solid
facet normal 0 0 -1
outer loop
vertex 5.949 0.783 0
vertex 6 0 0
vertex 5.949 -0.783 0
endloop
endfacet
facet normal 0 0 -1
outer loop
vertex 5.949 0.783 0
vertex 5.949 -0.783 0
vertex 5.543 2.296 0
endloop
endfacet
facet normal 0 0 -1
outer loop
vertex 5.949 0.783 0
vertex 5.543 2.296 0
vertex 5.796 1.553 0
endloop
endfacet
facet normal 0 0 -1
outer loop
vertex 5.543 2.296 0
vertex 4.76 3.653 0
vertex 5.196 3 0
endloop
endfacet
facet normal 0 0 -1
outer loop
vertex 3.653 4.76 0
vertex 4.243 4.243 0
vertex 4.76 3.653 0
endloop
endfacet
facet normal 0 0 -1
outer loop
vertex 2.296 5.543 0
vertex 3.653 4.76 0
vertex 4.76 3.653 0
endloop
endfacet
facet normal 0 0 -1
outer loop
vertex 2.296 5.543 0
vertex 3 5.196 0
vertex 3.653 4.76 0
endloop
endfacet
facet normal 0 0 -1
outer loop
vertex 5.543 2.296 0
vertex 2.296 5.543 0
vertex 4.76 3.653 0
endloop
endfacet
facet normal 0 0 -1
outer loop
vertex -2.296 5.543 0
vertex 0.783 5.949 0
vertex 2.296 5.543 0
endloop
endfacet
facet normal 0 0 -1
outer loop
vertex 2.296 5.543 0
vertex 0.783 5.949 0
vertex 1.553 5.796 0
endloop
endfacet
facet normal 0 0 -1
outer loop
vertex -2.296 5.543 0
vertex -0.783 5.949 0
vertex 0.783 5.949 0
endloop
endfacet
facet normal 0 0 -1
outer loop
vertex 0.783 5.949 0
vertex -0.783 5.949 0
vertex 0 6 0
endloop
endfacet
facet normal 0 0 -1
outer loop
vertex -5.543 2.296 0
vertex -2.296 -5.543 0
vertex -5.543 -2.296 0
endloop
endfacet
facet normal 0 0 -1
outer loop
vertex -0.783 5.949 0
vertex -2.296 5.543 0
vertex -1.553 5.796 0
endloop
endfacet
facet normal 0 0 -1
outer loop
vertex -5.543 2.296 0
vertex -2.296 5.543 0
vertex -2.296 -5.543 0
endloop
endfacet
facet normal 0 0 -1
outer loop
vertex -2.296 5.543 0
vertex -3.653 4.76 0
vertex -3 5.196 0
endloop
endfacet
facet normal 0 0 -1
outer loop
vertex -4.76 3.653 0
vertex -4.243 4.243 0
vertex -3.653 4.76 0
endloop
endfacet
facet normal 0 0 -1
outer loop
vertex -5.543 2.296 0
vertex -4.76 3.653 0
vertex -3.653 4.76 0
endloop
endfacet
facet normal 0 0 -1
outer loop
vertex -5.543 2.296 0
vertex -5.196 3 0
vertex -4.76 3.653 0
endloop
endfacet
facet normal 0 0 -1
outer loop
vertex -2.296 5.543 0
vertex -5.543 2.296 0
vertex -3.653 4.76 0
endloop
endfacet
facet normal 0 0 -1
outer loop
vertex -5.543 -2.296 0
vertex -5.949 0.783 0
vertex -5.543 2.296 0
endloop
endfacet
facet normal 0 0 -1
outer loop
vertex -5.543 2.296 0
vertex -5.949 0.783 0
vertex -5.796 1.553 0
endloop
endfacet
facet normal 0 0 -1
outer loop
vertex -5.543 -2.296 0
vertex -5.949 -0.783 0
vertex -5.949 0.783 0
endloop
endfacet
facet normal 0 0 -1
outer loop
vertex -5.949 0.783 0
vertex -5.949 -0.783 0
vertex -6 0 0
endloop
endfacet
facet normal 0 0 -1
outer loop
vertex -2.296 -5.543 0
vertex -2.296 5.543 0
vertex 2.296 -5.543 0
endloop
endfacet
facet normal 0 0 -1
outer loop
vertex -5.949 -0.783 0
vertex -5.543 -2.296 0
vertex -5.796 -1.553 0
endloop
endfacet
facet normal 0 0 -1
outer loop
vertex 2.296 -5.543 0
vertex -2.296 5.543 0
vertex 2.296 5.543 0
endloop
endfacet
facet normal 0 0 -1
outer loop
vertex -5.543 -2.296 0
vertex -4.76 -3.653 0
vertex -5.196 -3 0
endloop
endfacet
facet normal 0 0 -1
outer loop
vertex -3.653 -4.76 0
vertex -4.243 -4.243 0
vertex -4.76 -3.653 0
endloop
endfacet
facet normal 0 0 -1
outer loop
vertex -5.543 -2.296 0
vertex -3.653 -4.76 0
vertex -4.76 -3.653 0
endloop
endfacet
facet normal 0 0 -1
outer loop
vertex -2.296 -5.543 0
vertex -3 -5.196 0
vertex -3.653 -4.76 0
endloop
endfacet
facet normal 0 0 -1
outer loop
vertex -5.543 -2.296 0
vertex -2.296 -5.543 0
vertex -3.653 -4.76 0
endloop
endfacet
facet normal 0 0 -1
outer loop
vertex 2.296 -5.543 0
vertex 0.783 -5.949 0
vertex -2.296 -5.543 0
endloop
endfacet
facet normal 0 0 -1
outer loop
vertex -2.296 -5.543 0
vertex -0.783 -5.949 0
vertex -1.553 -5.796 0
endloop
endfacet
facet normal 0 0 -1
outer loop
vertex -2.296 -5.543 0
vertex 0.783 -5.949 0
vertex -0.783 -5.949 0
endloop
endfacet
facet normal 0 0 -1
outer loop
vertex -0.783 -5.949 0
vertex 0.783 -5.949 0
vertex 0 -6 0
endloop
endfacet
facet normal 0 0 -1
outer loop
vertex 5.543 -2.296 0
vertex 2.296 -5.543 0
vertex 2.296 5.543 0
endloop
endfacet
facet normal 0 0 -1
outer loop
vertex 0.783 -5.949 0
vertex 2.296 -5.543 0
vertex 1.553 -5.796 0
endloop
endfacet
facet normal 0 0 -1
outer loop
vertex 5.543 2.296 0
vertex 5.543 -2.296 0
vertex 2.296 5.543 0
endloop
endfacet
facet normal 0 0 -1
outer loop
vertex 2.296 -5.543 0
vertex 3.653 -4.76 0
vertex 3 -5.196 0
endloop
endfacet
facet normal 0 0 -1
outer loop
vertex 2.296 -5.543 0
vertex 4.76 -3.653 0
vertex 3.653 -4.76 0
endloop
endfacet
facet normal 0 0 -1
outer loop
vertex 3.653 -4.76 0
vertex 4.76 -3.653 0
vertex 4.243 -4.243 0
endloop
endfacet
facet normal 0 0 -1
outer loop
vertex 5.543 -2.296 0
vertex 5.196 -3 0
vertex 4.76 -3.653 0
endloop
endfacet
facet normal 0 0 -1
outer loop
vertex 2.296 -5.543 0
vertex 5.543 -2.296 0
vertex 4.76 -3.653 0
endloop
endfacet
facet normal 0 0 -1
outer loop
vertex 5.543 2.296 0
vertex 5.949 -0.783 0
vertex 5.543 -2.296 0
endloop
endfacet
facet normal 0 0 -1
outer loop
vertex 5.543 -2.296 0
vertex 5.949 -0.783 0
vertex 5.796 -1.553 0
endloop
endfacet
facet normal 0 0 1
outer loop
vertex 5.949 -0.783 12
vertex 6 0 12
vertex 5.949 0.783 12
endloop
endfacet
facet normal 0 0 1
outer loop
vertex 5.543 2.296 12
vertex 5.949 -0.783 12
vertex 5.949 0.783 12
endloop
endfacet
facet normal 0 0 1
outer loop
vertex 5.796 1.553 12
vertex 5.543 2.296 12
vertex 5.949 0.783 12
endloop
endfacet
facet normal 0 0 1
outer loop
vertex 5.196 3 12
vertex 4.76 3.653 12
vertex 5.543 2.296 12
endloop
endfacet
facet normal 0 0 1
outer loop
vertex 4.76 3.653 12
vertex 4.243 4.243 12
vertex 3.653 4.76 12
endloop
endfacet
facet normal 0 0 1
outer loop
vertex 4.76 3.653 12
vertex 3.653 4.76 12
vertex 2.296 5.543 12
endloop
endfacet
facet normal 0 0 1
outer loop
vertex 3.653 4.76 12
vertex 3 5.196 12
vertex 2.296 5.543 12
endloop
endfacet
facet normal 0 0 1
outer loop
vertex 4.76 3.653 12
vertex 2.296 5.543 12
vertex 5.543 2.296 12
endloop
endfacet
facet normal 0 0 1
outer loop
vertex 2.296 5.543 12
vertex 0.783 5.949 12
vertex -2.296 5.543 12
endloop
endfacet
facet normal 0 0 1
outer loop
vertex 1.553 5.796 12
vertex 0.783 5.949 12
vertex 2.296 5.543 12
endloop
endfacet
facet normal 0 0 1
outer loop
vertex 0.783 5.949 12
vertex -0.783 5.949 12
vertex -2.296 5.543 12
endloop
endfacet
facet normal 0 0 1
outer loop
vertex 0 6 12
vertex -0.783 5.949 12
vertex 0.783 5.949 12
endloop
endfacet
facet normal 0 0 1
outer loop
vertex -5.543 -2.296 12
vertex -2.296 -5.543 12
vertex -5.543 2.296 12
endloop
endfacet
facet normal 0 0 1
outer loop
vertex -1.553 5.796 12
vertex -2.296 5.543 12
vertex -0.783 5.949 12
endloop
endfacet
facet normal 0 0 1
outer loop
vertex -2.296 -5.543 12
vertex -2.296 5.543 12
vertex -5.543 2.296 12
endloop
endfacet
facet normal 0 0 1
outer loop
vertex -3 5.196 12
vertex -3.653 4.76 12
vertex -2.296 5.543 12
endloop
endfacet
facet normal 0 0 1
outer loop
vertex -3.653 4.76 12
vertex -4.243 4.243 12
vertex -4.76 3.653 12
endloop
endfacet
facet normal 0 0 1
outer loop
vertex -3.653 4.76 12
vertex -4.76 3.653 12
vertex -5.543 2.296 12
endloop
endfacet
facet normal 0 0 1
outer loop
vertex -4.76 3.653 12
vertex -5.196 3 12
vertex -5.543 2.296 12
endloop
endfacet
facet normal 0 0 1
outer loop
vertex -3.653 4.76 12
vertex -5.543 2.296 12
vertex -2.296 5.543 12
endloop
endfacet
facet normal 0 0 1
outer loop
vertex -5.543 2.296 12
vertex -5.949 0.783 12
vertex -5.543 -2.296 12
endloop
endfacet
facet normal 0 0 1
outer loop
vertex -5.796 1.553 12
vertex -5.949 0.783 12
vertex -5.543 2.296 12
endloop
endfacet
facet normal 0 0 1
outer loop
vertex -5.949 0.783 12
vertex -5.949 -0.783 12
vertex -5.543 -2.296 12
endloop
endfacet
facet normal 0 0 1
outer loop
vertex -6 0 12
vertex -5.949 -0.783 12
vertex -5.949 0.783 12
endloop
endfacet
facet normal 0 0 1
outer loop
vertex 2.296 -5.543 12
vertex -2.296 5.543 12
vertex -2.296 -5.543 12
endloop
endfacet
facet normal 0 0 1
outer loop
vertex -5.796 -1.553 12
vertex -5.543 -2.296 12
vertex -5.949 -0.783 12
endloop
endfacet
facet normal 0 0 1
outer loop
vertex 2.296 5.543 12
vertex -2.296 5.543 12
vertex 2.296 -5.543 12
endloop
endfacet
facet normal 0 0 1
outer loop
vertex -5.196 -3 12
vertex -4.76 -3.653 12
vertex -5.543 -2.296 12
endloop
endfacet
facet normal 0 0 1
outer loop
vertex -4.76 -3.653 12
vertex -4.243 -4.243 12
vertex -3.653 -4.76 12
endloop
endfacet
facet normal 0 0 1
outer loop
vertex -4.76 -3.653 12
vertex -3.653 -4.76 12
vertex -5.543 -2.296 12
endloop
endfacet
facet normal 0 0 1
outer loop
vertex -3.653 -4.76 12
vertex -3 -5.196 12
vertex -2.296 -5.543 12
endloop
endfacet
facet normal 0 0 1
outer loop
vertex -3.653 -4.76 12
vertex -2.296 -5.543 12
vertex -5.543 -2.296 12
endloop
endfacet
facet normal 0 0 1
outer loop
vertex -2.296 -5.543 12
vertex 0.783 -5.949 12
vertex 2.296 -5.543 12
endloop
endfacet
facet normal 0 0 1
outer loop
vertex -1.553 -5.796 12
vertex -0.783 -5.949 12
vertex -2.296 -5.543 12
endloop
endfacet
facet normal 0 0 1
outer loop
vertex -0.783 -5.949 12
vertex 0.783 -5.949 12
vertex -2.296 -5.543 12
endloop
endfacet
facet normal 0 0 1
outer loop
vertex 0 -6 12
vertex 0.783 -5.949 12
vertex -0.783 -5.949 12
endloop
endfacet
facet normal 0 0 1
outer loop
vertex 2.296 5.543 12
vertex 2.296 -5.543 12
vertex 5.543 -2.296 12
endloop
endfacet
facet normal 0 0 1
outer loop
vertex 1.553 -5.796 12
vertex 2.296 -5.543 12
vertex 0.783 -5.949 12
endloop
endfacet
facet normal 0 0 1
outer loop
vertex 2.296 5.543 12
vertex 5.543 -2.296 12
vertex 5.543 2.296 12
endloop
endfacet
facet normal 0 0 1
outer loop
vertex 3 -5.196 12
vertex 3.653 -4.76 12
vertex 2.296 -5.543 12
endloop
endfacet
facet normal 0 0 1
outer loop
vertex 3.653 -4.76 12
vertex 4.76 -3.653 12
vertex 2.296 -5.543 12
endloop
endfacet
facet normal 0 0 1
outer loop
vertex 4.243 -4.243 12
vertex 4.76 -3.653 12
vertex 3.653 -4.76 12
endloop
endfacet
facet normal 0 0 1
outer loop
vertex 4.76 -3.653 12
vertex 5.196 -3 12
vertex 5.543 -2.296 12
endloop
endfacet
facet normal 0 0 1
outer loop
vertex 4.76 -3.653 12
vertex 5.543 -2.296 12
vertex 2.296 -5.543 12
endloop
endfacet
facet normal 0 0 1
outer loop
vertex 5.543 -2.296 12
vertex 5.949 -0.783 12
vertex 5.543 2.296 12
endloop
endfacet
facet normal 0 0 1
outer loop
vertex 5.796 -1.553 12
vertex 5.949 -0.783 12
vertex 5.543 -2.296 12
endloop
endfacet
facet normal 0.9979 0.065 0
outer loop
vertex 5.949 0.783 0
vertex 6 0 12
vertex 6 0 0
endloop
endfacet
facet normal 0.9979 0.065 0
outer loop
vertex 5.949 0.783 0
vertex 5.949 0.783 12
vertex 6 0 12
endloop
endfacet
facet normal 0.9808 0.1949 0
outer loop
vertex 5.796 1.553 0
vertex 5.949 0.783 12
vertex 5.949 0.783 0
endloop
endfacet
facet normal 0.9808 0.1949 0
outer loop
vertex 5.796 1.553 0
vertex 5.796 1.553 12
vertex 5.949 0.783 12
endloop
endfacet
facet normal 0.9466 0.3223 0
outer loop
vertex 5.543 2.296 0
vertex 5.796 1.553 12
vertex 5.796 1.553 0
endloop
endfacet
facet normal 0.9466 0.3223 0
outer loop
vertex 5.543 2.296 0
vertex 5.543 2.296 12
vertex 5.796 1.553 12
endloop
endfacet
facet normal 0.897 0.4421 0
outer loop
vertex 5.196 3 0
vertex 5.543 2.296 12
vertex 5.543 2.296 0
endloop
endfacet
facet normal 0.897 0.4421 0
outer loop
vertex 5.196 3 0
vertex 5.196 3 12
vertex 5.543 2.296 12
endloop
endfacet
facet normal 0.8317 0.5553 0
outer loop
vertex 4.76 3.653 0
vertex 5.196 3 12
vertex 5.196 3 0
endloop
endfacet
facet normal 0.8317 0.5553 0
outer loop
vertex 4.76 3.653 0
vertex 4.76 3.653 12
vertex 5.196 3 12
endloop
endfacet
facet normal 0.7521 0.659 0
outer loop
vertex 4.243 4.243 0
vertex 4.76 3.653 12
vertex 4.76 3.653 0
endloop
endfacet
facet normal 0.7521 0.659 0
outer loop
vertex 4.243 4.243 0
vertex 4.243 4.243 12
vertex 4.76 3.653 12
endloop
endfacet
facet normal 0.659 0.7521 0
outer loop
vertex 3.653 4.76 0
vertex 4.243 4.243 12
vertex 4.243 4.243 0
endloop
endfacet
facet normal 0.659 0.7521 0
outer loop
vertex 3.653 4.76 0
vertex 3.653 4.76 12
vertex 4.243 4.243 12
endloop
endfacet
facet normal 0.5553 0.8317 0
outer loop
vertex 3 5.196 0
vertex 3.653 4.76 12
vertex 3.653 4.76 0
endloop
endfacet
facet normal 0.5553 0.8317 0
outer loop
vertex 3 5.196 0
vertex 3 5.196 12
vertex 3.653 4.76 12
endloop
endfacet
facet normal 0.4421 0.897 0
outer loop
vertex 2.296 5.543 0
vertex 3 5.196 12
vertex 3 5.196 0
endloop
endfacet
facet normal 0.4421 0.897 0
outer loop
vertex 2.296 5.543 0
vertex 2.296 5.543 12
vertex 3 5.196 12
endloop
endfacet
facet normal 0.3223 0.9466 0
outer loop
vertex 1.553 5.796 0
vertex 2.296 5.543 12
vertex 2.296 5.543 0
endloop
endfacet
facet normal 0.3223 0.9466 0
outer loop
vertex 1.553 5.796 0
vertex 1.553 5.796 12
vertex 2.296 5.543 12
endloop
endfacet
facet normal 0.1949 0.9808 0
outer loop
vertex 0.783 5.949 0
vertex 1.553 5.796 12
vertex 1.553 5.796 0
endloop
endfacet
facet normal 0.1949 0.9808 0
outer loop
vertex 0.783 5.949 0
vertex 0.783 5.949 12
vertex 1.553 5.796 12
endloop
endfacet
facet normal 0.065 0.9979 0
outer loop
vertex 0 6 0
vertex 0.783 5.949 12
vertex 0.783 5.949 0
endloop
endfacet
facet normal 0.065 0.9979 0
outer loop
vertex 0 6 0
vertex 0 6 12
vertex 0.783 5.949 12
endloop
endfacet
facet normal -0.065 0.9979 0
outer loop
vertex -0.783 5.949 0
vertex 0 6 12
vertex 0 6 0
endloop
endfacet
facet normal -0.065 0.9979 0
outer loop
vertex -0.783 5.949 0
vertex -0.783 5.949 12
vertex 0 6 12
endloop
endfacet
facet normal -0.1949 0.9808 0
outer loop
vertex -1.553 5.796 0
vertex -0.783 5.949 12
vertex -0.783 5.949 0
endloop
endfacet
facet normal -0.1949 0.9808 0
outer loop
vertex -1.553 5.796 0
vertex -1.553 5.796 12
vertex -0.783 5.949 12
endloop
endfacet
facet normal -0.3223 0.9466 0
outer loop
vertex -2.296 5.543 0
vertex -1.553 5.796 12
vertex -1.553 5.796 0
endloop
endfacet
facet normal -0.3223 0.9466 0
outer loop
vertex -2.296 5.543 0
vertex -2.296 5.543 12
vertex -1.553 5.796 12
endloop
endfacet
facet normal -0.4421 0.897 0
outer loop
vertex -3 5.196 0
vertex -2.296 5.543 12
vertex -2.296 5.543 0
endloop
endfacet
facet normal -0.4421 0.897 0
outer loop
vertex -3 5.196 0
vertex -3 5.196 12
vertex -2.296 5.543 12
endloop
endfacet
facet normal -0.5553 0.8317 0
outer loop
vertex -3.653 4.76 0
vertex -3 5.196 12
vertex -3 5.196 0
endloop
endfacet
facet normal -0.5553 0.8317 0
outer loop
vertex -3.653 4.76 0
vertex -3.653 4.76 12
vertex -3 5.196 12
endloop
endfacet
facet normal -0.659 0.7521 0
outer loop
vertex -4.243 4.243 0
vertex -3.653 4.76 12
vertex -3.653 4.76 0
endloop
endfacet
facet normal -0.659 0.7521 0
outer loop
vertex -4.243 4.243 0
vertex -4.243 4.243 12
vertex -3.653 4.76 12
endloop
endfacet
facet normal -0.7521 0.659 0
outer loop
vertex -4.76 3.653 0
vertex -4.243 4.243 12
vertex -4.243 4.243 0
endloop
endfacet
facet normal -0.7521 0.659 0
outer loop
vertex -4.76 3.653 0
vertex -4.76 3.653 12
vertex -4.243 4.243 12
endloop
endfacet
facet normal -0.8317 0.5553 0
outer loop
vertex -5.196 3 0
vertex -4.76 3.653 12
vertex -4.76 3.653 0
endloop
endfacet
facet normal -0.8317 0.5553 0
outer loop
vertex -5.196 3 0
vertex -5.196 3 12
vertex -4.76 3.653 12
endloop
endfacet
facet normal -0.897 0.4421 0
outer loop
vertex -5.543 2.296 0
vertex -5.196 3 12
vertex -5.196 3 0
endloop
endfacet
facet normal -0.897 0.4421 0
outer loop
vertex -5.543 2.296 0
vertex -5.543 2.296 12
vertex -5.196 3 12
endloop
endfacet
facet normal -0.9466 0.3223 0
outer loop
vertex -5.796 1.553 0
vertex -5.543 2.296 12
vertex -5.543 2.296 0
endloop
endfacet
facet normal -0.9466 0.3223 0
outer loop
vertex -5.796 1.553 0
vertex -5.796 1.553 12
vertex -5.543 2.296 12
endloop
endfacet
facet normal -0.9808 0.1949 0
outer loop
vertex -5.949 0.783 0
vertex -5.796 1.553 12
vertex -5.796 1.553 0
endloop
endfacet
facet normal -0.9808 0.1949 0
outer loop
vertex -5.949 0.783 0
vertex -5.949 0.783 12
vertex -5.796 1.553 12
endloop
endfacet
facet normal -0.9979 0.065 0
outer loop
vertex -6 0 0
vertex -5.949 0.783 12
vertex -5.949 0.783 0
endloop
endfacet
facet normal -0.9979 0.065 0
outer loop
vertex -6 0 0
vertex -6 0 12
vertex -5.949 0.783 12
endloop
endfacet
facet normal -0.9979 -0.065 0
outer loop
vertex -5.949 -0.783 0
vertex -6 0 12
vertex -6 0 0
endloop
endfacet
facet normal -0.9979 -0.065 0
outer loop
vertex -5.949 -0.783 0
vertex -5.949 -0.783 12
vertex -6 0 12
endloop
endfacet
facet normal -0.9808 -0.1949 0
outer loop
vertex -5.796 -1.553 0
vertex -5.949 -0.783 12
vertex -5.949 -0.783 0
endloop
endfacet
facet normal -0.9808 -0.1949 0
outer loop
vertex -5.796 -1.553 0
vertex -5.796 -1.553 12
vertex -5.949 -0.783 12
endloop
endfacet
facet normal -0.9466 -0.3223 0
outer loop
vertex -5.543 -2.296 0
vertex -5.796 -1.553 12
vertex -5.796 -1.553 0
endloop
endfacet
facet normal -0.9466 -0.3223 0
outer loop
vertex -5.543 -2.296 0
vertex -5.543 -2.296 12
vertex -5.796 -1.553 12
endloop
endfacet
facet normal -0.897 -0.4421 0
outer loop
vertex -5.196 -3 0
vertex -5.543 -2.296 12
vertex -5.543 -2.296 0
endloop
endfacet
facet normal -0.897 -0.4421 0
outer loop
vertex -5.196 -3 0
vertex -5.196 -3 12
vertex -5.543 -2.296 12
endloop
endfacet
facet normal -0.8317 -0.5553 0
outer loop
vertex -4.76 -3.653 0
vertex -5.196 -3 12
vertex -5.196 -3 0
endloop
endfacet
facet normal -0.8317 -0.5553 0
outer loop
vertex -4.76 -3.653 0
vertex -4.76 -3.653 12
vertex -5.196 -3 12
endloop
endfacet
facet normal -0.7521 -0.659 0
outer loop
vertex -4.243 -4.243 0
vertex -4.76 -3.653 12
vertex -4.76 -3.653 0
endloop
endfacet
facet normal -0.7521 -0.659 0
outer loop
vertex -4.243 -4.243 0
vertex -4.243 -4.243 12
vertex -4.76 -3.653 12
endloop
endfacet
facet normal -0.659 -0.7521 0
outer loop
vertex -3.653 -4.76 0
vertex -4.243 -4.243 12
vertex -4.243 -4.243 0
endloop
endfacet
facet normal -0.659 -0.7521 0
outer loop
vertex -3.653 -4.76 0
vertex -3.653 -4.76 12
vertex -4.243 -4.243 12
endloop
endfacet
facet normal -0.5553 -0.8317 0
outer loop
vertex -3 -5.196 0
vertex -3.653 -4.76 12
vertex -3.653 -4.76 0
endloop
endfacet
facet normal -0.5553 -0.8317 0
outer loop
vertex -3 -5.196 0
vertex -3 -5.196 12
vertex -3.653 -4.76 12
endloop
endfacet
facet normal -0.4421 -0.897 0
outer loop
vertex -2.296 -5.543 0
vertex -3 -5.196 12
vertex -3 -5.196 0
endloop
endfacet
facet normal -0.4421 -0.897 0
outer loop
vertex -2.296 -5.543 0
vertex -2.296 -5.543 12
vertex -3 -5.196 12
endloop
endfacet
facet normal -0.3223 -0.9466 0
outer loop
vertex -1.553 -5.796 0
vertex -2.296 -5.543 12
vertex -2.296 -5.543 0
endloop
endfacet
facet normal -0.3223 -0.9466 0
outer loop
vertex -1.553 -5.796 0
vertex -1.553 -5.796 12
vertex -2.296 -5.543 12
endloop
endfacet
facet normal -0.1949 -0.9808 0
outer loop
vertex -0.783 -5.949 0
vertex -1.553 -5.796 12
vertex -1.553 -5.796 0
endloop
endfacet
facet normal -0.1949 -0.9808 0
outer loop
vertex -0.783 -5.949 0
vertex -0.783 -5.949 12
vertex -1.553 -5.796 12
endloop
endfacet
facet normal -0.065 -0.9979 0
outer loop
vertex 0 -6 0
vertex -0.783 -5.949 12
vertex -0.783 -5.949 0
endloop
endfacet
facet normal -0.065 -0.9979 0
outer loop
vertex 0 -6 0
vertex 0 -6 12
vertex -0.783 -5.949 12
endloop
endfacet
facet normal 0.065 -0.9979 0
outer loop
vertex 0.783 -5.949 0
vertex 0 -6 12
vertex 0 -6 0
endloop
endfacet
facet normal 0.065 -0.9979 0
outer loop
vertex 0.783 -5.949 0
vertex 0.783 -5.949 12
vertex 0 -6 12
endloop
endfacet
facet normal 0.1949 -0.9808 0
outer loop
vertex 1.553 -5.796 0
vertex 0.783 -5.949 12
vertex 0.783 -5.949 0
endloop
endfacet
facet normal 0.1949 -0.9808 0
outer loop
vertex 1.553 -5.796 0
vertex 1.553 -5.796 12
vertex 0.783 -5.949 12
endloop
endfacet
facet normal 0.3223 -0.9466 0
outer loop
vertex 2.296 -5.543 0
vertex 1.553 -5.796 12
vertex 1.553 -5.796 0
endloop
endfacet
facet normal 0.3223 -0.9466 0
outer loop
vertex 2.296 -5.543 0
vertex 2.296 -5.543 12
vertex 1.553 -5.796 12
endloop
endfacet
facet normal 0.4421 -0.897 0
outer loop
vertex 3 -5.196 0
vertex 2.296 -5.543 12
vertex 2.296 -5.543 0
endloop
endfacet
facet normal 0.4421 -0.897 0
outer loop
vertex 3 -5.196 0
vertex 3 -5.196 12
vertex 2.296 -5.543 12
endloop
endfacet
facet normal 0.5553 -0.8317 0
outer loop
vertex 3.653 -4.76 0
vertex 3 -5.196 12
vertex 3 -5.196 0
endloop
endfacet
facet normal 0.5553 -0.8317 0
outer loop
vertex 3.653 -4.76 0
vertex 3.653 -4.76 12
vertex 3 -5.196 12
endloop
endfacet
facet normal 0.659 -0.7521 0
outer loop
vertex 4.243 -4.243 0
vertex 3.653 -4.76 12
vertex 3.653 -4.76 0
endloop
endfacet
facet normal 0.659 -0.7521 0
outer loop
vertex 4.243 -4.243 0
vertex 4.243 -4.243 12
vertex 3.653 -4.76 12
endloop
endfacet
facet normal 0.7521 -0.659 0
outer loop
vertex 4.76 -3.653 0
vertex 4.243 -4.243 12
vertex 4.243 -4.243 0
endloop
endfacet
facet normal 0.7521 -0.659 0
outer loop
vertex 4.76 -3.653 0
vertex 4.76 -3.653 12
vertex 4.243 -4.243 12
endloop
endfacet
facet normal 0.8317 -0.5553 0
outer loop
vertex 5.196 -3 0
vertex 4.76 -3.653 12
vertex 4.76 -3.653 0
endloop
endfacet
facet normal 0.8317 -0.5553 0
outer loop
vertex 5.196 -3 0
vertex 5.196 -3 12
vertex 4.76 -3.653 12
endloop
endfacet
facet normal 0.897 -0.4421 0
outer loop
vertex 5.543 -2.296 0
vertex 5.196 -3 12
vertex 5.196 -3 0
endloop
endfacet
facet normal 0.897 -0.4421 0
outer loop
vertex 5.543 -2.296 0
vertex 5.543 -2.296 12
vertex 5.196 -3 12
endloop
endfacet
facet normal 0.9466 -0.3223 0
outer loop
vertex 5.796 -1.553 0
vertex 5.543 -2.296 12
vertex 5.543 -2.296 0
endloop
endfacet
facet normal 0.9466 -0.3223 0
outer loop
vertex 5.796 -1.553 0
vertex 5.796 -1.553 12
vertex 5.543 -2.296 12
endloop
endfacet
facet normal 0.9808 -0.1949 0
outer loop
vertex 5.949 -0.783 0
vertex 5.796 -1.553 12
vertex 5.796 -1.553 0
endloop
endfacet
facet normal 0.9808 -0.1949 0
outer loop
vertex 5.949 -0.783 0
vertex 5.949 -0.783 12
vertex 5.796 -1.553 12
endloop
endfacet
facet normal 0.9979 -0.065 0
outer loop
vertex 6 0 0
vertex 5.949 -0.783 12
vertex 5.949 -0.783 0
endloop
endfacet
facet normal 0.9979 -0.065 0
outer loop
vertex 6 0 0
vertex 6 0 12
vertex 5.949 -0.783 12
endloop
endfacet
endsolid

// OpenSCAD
// Construct: linear_extrude() of a 2D profile into a solid.
linear_extrude(height = 12) circle(r = 6, $fn = 48);
